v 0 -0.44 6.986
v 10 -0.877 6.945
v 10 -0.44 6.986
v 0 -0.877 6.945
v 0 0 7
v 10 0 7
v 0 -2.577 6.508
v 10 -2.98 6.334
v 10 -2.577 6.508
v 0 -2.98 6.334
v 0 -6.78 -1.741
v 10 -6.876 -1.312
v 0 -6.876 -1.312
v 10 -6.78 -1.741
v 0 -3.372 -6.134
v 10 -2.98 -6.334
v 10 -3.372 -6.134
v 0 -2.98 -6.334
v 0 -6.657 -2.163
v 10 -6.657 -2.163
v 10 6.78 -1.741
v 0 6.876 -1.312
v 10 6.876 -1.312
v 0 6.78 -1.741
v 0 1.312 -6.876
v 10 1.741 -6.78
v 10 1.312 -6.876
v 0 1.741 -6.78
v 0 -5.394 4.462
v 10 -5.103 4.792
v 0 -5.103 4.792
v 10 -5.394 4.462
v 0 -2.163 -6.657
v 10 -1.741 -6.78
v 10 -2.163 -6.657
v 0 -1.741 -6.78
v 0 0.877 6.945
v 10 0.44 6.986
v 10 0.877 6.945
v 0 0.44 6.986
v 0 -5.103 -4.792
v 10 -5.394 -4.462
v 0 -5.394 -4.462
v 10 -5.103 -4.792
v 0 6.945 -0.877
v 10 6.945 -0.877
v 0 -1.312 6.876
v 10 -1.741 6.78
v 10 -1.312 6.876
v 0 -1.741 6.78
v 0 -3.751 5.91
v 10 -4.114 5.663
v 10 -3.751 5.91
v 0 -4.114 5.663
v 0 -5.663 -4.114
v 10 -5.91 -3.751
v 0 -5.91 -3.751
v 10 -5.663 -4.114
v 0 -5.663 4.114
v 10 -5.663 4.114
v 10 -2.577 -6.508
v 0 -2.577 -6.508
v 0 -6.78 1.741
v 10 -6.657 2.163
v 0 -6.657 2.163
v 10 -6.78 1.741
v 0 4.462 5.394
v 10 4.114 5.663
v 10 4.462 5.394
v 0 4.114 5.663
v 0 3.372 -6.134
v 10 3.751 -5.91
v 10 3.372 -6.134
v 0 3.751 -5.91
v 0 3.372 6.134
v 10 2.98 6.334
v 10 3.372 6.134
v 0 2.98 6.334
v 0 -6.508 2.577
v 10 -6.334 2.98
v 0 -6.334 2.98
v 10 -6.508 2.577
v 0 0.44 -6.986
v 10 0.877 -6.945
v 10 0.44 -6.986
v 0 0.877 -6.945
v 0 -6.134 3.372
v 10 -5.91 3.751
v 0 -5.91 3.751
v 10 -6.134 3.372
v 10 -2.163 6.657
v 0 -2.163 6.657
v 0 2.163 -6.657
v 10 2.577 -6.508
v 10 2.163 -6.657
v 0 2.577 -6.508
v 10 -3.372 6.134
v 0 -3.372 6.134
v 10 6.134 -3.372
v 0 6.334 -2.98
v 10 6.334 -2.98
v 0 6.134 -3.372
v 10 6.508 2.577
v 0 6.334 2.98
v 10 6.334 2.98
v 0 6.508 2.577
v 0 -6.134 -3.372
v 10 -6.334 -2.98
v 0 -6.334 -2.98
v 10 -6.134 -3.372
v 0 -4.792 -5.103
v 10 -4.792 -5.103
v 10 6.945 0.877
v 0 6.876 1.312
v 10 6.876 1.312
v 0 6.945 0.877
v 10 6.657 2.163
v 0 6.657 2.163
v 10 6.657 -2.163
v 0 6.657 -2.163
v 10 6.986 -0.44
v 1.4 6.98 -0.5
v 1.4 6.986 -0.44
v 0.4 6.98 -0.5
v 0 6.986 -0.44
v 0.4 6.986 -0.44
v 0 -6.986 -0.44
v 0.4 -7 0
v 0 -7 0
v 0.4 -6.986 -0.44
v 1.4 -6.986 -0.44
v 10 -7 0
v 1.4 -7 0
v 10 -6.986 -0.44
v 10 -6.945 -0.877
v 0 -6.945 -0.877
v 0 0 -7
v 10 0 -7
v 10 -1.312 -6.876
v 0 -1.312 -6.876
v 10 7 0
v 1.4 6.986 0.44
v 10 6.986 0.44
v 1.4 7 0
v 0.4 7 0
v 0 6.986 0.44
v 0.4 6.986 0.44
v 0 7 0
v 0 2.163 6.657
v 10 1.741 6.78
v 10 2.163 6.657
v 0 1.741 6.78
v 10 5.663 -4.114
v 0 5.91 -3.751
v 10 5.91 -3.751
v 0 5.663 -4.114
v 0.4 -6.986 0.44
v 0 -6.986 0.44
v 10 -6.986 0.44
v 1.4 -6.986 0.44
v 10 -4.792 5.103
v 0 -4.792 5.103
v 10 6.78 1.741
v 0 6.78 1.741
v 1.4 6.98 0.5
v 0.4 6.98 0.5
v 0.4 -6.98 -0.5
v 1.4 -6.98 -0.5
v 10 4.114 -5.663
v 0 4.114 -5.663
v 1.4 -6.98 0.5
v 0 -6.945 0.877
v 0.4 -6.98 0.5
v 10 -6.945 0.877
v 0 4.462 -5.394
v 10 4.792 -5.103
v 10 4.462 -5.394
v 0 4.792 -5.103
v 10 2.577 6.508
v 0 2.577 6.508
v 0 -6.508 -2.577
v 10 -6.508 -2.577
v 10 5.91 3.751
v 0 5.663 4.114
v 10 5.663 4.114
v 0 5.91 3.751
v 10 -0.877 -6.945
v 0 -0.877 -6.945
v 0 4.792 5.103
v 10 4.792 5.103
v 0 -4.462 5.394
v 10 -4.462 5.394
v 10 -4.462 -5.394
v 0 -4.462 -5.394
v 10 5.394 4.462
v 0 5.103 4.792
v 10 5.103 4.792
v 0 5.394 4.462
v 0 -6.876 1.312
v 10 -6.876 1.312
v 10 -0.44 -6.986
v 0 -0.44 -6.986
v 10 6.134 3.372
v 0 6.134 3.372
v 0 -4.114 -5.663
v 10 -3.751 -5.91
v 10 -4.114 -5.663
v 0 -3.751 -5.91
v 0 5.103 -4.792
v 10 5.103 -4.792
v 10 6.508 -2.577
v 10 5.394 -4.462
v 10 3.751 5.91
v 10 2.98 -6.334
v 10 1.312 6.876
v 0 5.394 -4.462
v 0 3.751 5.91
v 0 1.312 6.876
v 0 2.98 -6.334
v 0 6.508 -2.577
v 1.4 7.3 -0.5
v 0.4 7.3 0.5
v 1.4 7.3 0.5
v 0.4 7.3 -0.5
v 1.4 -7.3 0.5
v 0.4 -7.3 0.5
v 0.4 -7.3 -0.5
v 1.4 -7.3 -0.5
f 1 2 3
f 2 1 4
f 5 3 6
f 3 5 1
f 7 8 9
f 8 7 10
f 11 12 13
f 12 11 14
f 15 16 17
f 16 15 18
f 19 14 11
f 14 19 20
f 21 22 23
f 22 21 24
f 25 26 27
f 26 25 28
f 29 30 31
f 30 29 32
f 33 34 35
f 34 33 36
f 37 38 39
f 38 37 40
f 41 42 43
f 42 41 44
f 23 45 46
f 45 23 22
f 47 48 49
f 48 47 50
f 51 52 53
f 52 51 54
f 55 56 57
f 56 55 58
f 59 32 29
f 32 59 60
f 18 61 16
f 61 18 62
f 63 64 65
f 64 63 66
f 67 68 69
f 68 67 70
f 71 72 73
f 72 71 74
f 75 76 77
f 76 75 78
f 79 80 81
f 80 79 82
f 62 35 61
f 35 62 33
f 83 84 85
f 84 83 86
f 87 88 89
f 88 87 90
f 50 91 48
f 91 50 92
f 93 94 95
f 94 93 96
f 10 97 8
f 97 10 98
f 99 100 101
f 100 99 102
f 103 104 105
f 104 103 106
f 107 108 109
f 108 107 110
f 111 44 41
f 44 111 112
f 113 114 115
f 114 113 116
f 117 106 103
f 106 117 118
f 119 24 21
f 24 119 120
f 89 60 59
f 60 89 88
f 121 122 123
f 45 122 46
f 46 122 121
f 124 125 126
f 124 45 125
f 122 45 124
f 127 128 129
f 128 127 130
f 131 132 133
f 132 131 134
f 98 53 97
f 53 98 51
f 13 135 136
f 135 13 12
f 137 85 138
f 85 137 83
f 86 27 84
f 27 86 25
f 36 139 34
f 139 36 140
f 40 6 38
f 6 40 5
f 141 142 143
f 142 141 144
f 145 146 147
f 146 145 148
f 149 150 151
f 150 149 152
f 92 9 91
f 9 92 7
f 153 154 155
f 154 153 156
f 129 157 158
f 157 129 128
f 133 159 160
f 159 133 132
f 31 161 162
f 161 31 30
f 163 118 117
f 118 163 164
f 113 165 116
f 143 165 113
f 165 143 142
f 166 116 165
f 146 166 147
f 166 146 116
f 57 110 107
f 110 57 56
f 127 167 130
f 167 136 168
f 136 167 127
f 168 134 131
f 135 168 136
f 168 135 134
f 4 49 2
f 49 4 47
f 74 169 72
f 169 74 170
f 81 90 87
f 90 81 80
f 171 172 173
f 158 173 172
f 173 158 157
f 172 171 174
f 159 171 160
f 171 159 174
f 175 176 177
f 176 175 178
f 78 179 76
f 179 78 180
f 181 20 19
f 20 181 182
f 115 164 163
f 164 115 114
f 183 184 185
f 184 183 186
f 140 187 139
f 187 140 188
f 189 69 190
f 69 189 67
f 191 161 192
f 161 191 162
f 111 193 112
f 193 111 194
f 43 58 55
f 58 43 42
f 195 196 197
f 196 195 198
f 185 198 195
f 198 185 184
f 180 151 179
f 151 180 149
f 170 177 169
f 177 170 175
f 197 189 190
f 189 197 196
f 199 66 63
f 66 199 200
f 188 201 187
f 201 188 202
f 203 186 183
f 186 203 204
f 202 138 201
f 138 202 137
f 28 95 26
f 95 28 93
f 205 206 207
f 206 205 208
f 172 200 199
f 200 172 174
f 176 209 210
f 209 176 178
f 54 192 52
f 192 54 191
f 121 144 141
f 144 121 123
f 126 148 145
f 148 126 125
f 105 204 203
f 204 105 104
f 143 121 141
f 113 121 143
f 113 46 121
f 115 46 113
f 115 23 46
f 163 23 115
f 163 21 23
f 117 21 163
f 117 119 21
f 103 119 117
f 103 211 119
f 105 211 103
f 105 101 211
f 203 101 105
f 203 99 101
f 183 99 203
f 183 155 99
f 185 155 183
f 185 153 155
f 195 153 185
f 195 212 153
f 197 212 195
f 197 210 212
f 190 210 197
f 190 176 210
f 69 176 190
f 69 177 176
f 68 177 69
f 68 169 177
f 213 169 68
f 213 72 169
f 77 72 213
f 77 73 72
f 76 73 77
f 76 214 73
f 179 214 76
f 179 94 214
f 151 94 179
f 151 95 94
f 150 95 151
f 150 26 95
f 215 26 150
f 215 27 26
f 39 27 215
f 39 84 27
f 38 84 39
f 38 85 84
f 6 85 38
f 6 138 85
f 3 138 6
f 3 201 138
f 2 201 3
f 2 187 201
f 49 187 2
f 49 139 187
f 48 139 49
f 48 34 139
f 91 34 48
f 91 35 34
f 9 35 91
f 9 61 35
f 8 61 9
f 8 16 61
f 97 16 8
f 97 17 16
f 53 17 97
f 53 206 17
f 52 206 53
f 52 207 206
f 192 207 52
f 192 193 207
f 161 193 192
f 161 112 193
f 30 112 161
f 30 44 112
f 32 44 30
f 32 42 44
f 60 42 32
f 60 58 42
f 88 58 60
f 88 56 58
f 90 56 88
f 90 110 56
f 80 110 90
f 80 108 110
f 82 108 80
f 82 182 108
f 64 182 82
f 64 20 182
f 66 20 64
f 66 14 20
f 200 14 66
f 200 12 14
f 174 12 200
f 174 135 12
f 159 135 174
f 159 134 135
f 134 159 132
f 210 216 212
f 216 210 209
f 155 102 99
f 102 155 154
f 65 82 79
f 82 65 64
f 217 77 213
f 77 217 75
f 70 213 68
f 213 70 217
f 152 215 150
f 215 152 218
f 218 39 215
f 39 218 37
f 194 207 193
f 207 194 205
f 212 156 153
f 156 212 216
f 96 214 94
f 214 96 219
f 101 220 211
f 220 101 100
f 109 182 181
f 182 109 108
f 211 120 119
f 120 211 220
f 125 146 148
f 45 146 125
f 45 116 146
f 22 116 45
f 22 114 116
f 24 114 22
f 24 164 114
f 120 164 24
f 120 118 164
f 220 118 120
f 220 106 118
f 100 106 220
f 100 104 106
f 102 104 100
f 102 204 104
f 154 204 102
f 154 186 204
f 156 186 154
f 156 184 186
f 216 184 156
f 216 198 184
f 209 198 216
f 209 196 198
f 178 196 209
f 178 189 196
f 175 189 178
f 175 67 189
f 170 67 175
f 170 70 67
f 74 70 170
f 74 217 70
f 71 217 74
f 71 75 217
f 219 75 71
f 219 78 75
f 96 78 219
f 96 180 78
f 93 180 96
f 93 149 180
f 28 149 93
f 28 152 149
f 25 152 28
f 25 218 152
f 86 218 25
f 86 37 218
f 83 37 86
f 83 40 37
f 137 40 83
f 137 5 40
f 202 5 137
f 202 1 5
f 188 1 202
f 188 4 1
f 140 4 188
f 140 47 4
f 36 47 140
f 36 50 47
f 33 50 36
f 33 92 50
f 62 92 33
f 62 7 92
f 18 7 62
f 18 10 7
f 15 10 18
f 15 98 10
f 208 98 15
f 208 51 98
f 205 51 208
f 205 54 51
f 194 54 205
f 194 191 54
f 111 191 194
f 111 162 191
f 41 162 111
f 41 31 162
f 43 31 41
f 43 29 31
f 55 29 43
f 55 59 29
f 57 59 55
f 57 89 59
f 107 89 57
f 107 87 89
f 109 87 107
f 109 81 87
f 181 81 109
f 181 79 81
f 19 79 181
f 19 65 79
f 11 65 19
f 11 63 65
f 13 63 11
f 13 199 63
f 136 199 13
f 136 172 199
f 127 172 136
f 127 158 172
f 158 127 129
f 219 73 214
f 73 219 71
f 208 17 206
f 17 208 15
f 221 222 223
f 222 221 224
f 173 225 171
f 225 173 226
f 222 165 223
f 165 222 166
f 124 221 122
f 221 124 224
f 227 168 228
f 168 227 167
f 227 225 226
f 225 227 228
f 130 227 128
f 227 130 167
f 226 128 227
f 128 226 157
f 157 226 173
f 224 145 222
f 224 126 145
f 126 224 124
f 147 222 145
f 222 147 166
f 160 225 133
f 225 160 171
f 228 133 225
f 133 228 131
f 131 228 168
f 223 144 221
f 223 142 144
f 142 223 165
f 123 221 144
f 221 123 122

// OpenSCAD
difference(){
  rotate(a=90,v=[0,0,1000]){
    translate([0,-5,0]){
      rotate(a=90,v=[0,0,1000]){
        rotate([0,-90,0]){cylinder($fn=100,h=10,r=7,center=true);}
      }
    }
    translate([0,-0.4,0]){
      translate([0,-0.5,0]){
        cube([14.6,1,1],center=true);
      }
    }
  }
}
